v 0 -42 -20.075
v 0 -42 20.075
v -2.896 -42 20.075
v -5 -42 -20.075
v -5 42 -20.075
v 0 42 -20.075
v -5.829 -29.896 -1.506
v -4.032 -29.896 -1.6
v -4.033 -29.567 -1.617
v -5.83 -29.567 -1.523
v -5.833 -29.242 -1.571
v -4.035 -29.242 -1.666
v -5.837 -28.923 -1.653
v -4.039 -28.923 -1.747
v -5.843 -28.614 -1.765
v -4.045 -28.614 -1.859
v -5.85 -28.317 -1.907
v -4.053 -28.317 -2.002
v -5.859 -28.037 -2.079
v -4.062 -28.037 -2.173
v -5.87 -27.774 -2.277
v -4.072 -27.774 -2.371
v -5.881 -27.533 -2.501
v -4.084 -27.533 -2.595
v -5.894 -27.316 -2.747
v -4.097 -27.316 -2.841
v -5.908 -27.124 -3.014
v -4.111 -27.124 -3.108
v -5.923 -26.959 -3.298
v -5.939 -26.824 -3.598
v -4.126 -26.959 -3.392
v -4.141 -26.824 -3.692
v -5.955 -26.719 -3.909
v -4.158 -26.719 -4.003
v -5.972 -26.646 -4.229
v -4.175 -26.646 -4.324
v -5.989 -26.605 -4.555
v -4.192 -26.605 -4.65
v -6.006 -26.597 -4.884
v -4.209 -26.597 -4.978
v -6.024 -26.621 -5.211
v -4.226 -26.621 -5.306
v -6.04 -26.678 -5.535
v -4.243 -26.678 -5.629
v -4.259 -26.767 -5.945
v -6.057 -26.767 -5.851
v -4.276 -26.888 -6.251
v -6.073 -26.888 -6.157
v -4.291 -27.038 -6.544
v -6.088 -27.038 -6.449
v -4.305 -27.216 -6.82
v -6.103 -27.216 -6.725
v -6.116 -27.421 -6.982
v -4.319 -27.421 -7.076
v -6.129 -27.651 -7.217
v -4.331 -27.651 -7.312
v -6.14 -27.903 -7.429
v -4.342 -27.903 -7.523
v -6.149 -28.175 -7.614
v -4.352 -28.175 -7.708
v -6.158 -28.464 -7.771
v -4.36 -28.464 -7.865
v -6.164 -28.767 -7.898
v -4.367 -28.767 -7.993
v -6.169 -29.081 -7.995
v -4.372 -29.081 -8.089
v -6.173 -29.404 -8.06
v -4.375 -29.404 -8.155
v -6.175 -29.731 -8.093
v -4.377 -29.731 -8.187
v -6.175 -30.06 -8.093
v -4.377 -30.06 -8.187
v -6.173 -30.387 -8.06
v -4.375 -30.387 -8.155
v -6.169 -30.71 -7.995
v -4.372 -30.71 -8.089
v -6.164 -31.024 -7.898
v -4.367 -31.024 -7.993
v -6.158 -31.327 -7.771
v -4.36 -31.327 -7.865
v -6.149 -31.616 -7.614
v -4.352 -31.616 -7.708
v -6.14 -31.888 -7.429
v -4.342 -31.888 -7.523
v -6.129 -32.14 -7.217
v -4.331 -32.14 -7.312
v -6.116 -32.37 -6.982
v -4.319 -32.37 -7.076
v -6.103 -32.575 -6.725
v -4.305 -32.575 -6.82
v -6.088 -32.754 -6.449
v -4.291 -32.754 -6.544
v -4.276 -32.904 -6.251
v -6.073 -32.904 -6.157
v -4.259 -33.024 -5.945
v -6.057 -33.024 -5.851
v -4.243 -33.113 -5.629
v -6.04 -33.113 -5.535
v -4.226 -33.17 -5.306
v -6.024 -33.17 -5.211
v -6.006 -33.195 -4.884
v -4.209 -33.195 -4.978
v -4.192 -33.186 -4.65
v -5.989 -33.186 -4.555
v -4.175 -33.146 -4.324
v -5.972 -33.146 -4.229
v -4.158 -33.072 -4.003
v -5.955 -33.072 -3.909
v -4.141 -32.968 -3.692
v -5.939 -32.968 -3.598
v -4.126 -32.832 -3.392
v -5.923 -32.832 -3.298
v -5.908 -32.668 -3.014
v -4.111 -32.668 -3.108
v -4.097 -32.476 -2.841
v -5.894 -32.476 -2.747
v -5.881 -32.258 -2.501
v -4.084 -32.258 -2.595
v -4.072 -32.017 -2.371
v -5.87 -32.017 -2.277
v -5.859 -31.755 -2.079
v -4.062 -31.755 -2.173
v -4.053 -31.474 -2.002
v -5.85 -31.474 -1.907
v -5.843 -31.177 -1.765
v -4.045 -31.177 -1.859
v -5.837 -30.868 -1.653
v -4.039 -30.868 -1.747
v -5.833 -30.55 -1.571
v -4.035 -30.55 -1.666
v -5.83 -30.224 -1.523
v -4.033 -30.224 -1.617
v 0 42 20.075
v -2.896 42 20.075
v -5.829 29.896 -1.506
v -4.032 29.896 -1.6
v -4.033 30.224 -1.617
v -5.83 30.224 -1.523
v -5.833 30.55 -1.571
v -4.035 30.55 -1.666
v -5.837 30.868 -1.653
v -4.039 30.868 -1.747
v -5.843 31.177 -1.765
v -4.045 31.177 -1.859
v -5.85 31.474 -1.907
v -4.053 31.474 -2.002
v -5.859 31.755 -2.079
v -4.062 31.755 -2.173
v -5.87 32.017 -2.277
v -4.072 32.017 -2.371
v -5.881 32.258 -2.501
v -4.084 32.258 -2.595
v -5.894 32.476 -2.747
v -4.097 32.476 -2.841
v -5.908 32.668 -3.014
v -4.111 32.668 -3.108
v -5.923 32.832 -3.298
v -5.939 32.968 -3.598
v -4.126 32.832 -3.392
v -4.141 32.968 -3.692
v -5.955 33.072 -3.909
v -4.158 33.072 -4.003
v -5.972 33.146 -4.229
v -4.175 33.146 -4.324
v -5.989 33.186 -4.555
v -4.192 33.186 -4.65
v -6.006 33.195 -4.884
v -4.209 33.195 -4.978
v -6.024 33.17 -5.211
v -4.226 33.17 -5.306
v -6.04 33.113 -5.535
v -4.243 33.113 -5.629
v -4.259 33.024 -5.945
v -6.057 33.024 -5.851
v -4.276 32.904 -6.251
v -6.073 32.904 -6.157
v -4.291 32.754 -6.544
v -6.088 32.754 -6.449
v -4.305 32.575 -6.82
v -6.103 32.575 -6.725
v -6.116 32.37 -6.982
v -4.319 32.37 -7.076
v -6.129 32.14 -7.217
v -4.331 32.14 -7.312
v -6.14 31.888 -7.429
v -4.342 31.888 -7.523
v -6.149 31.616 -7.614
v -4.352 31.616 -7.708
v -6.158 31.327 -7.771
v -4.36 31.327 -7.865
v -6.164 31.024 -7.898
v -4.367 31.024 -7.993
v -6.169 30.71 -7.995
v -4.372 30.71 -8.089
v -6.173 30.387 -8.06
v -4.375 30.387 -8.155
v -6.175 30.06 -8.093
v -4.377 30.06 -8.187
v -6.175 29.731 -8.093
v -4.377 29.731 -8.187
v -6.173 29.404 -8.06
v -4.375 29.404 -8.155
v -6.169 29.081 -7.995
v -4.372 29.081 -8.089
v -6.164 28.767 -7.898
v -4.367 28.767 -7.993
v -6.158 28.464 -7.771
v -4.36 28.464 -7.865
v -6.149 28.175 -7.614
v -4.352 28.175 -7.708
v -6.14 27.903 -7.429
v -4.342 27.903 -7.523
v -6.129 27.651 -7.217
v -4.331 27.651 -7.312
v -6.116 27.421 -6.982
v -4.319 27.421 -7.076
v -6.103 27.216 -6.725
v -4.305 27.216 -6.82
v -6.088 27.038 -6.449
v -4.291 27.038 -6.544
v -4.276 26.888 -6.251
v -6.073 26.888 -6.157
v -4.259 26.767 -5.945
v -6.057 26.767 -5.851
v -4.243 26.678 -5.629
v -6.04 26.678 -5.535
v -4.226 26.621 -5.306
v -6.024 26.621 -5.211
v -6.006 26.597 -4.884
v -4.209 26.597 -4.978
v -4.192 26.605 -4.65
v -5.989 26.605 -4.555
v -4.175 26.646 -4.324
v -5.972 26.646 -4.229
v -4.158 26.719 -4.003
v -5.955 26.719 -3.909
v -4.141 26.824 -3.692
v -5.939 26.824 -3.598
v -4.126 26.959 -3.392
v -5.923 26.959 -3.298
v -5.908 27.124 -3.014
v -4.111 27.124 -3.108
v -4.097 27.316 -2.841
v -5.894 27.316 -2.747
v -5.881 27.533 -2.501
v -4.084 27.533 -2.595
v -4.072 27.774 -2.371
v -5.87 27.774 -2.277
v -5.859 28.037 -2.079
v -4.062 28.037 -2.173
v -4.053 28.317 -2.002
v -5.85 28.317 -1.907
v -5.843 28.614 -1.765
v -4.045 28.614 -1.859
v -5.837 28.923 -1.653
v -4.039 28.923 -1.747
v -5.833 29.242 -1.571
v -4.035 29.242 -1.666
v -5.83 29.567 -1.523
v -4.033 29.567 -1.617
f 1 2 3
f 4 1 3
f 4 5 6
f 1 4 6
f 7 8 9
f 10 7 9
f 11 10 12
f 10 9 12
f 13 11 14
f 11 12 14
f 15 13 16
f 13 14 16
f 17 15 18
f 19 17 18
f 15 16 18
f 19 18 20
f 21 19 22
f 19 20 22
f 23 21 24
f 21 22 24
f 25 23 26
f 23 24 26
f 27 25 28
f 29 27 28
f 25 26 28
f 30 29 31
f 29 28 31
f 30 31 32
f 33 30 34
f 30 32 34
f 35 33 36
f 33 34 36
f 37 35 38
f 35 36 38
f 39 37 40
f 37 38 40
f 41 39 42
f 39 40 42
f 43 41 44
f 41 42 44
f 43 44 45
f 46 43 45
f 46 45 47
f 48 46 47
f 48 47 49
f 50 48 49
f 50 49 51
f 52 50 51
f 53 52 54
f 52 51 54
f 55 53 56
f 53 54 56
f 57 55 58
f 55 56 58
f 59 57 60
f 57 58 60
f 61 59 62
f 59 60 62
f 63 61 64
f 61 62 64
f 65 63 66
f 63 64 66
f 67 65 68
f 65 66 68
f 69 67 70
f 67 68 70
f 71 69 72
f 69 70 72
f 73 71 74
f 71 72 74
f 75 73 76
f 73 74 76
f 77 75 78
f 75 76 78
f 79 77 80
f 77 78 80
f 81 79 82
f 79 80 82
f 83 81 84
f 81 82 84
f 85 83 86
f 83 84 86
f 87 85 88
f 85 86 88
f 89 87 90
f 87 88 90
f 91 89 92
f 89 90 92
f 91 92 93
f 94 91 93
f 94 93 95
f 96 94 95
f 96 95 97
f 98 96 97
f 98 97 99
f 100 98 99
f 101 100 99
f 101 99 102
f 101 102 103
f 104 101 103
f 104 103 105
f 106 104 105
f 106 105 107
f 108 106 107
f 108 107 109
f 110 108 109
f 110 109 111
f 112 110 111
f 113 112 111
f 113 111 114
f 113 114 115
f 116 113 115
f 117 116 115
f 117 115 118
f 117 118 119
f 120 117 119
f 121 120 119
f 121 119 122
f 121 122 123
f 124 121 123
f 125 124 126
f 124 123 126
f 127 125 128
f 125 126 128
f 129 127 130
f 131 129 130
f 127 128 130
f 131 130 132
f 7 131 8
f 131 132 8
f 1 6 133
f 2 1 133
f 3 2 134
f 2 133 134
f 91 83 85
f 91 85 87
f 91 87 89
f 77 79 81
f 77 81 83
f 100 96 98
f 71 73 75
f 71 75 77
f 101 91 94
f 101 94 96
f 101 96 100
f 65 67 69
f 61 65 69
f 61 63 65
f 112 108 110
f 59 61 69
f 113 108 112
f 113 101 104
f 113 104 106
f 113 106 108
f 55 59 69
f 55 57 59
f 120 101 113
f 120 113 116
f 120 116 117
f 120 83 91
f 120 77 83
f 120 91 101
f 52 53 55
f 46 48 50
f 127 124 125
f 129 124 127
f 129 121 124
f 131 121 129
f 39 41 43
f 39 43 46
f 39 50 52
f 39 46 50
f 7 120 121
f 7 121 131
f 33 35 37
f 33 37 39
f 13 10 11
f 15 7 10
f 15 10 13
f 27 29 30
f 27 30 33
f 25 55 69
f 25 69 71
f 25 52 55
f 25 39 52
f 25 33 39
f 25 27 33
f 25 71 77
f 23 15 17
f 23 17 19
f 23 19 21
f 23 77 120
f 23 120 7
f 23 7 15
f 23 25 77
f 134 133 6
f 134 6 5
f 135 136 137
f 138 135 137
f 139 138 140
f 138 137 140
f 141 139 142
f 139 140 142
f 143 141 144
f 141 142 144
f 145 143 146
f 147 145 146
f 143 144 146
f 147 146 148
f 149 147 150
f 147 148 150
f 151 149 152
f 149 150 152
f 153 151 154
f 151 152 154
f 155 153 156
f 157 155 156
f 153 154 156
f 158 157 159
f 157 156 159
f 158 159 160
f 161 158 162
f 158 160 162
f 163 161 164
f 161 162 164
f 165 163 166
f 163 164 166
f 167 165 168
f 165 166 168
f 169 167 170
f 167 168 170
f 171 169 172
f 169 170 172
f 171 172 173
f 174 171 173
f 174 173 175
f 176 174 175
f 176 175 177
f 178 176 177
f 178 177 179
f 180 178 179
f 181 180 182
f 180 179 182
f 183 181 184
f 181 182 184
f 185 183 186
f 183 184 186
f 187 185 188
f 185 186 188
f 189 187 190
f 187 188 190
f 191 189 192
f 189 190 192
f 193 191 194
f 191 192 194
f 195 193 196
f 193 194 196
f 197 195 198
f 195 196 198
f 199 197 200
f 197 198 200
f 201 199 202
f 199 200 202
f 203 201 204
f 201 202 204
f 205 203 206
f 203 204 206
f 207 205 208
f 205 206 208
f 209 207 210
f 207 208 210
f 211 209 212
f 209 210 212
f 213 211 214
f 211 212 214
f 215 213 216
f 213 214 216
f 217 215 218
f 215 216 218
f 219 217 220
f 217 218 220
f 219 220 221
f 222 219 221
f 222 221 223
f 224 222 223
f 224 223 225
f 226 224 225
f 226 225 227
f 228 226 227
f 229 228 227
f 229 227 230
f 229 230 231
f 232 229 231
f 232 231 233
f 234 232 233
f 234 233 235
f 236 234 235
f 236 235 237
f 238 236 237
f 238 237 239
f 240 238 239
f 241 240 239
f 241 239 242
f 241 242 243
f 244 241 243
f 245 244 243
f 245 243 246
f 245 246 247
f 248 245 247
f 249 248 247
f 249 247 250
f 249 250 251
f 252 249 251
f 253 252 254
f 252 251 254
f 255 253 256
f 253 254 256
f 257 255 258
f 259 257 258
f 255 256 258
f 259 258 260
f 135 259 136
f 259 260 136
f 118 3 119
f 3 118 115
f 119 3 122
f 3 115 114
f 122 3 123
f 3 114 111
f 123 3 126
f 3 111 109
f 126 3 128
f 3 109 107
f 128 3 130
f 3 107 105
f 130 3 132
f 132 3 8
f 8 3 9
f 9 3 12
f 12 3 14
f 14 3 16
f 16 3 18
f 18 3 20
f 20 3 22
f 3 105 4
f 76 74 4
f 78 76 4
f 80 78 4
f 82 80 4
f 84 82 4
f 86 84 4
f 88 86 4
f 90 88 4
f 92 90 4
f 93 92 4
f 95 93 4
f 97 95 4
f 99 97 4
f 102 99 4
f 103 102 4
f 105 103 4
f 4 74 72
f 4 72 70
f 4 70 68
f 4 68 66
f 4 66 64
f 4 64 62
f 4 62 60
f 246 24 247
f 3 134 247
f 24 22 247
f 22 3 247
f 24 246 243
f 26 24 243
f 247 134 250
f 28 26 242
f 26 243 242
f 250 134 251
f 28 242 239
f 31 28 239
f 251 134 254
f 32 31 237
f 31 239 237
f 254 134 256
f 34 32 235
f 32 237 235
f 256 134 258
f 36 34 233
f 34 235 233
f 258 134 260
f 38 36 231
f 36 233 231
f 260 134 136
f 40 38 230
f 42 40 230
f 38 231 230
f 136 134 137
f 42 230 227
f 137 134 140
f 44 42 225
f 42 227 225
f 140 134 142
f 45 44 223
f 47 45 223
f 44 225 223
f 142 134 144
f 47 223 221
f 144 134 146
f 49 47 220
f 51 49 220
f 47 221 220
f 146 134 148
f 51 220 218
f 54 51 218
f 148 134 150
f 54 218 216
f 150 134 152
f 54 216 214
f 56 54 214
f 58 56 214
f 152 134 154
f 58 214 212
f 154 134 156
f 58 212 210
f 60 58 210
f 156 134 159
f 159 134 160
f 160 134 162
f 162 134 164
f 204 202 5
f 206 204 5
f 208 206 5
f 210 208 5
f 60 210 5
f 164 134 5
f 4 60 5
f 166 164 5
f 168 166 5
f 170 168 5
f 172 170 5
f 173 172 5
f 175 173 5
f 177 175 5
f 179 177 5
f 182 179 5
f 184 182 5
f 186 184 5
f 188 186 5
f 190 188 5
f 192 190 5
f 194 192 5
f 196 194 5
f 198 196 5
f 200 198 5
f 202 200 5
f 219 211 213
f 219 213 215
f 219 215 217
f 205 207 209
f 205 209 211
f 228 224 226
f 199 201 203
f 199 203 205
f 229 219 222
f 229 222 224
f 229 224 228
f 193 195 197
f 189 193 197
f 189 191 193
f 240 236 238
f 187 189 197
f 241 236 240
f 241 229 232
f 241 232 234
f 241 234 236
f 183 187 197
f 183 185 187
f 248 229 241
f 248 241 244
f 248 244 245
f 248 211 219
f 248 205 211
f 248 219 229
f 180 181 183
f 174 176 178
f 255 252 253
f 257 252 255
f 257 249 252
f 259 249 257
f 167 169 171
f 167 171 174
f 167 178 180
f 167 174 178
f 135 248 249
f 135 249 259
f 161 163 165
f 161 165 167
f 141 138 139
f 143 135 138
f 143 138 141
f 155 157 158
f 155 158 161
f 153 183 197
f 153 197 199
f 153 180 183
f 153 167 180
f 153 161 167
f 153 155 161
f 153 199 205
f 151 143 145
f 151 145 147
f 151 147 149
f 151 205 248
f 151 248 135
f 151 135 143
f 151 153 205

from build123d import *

# Parameters (mm, degrees)
BOSS_EXTRUDE1_DEPTH = 42
SKETCH2_R           = 3.3
BOSS_EXTRUDE2_DEPTH = 1.8


with BuildPart() as part:
    # Sketch1 → Boss-Extrude1 (new body, symmetric)
    with BuildSketch(Plane(origin=(0, 0, 0), x_dir=(1, 0, 0), z_dir=(0, 1, 0))):
        Polygon((0, 20.075), (0, -20.075), (-2.895827662, -20.075), (-5, 20.075), align=None)
    extrude(amount=BOSS_EXTRUDE1_DEPTH, both=True)

    # Sketch2 → Boss-Extrude2 (add)
    with BuildSketch(Plane(origin=(-3.937100288, 0, 0.206334683), x_dir=(0.052335956, 0, 0.998629535), z_dir=(-0.998629535, 0, 0.052335956))):
        with Locations((-5.109167691, -29.895651858)):
            Circle(SKETCH2_R)
        with Locations((-5.109167691, 29.895651858)):
            Circle(SKETCH2_R)
    extrude(amount=BOSS_EXTRUDE2_DEPTH)


solid = part.part
